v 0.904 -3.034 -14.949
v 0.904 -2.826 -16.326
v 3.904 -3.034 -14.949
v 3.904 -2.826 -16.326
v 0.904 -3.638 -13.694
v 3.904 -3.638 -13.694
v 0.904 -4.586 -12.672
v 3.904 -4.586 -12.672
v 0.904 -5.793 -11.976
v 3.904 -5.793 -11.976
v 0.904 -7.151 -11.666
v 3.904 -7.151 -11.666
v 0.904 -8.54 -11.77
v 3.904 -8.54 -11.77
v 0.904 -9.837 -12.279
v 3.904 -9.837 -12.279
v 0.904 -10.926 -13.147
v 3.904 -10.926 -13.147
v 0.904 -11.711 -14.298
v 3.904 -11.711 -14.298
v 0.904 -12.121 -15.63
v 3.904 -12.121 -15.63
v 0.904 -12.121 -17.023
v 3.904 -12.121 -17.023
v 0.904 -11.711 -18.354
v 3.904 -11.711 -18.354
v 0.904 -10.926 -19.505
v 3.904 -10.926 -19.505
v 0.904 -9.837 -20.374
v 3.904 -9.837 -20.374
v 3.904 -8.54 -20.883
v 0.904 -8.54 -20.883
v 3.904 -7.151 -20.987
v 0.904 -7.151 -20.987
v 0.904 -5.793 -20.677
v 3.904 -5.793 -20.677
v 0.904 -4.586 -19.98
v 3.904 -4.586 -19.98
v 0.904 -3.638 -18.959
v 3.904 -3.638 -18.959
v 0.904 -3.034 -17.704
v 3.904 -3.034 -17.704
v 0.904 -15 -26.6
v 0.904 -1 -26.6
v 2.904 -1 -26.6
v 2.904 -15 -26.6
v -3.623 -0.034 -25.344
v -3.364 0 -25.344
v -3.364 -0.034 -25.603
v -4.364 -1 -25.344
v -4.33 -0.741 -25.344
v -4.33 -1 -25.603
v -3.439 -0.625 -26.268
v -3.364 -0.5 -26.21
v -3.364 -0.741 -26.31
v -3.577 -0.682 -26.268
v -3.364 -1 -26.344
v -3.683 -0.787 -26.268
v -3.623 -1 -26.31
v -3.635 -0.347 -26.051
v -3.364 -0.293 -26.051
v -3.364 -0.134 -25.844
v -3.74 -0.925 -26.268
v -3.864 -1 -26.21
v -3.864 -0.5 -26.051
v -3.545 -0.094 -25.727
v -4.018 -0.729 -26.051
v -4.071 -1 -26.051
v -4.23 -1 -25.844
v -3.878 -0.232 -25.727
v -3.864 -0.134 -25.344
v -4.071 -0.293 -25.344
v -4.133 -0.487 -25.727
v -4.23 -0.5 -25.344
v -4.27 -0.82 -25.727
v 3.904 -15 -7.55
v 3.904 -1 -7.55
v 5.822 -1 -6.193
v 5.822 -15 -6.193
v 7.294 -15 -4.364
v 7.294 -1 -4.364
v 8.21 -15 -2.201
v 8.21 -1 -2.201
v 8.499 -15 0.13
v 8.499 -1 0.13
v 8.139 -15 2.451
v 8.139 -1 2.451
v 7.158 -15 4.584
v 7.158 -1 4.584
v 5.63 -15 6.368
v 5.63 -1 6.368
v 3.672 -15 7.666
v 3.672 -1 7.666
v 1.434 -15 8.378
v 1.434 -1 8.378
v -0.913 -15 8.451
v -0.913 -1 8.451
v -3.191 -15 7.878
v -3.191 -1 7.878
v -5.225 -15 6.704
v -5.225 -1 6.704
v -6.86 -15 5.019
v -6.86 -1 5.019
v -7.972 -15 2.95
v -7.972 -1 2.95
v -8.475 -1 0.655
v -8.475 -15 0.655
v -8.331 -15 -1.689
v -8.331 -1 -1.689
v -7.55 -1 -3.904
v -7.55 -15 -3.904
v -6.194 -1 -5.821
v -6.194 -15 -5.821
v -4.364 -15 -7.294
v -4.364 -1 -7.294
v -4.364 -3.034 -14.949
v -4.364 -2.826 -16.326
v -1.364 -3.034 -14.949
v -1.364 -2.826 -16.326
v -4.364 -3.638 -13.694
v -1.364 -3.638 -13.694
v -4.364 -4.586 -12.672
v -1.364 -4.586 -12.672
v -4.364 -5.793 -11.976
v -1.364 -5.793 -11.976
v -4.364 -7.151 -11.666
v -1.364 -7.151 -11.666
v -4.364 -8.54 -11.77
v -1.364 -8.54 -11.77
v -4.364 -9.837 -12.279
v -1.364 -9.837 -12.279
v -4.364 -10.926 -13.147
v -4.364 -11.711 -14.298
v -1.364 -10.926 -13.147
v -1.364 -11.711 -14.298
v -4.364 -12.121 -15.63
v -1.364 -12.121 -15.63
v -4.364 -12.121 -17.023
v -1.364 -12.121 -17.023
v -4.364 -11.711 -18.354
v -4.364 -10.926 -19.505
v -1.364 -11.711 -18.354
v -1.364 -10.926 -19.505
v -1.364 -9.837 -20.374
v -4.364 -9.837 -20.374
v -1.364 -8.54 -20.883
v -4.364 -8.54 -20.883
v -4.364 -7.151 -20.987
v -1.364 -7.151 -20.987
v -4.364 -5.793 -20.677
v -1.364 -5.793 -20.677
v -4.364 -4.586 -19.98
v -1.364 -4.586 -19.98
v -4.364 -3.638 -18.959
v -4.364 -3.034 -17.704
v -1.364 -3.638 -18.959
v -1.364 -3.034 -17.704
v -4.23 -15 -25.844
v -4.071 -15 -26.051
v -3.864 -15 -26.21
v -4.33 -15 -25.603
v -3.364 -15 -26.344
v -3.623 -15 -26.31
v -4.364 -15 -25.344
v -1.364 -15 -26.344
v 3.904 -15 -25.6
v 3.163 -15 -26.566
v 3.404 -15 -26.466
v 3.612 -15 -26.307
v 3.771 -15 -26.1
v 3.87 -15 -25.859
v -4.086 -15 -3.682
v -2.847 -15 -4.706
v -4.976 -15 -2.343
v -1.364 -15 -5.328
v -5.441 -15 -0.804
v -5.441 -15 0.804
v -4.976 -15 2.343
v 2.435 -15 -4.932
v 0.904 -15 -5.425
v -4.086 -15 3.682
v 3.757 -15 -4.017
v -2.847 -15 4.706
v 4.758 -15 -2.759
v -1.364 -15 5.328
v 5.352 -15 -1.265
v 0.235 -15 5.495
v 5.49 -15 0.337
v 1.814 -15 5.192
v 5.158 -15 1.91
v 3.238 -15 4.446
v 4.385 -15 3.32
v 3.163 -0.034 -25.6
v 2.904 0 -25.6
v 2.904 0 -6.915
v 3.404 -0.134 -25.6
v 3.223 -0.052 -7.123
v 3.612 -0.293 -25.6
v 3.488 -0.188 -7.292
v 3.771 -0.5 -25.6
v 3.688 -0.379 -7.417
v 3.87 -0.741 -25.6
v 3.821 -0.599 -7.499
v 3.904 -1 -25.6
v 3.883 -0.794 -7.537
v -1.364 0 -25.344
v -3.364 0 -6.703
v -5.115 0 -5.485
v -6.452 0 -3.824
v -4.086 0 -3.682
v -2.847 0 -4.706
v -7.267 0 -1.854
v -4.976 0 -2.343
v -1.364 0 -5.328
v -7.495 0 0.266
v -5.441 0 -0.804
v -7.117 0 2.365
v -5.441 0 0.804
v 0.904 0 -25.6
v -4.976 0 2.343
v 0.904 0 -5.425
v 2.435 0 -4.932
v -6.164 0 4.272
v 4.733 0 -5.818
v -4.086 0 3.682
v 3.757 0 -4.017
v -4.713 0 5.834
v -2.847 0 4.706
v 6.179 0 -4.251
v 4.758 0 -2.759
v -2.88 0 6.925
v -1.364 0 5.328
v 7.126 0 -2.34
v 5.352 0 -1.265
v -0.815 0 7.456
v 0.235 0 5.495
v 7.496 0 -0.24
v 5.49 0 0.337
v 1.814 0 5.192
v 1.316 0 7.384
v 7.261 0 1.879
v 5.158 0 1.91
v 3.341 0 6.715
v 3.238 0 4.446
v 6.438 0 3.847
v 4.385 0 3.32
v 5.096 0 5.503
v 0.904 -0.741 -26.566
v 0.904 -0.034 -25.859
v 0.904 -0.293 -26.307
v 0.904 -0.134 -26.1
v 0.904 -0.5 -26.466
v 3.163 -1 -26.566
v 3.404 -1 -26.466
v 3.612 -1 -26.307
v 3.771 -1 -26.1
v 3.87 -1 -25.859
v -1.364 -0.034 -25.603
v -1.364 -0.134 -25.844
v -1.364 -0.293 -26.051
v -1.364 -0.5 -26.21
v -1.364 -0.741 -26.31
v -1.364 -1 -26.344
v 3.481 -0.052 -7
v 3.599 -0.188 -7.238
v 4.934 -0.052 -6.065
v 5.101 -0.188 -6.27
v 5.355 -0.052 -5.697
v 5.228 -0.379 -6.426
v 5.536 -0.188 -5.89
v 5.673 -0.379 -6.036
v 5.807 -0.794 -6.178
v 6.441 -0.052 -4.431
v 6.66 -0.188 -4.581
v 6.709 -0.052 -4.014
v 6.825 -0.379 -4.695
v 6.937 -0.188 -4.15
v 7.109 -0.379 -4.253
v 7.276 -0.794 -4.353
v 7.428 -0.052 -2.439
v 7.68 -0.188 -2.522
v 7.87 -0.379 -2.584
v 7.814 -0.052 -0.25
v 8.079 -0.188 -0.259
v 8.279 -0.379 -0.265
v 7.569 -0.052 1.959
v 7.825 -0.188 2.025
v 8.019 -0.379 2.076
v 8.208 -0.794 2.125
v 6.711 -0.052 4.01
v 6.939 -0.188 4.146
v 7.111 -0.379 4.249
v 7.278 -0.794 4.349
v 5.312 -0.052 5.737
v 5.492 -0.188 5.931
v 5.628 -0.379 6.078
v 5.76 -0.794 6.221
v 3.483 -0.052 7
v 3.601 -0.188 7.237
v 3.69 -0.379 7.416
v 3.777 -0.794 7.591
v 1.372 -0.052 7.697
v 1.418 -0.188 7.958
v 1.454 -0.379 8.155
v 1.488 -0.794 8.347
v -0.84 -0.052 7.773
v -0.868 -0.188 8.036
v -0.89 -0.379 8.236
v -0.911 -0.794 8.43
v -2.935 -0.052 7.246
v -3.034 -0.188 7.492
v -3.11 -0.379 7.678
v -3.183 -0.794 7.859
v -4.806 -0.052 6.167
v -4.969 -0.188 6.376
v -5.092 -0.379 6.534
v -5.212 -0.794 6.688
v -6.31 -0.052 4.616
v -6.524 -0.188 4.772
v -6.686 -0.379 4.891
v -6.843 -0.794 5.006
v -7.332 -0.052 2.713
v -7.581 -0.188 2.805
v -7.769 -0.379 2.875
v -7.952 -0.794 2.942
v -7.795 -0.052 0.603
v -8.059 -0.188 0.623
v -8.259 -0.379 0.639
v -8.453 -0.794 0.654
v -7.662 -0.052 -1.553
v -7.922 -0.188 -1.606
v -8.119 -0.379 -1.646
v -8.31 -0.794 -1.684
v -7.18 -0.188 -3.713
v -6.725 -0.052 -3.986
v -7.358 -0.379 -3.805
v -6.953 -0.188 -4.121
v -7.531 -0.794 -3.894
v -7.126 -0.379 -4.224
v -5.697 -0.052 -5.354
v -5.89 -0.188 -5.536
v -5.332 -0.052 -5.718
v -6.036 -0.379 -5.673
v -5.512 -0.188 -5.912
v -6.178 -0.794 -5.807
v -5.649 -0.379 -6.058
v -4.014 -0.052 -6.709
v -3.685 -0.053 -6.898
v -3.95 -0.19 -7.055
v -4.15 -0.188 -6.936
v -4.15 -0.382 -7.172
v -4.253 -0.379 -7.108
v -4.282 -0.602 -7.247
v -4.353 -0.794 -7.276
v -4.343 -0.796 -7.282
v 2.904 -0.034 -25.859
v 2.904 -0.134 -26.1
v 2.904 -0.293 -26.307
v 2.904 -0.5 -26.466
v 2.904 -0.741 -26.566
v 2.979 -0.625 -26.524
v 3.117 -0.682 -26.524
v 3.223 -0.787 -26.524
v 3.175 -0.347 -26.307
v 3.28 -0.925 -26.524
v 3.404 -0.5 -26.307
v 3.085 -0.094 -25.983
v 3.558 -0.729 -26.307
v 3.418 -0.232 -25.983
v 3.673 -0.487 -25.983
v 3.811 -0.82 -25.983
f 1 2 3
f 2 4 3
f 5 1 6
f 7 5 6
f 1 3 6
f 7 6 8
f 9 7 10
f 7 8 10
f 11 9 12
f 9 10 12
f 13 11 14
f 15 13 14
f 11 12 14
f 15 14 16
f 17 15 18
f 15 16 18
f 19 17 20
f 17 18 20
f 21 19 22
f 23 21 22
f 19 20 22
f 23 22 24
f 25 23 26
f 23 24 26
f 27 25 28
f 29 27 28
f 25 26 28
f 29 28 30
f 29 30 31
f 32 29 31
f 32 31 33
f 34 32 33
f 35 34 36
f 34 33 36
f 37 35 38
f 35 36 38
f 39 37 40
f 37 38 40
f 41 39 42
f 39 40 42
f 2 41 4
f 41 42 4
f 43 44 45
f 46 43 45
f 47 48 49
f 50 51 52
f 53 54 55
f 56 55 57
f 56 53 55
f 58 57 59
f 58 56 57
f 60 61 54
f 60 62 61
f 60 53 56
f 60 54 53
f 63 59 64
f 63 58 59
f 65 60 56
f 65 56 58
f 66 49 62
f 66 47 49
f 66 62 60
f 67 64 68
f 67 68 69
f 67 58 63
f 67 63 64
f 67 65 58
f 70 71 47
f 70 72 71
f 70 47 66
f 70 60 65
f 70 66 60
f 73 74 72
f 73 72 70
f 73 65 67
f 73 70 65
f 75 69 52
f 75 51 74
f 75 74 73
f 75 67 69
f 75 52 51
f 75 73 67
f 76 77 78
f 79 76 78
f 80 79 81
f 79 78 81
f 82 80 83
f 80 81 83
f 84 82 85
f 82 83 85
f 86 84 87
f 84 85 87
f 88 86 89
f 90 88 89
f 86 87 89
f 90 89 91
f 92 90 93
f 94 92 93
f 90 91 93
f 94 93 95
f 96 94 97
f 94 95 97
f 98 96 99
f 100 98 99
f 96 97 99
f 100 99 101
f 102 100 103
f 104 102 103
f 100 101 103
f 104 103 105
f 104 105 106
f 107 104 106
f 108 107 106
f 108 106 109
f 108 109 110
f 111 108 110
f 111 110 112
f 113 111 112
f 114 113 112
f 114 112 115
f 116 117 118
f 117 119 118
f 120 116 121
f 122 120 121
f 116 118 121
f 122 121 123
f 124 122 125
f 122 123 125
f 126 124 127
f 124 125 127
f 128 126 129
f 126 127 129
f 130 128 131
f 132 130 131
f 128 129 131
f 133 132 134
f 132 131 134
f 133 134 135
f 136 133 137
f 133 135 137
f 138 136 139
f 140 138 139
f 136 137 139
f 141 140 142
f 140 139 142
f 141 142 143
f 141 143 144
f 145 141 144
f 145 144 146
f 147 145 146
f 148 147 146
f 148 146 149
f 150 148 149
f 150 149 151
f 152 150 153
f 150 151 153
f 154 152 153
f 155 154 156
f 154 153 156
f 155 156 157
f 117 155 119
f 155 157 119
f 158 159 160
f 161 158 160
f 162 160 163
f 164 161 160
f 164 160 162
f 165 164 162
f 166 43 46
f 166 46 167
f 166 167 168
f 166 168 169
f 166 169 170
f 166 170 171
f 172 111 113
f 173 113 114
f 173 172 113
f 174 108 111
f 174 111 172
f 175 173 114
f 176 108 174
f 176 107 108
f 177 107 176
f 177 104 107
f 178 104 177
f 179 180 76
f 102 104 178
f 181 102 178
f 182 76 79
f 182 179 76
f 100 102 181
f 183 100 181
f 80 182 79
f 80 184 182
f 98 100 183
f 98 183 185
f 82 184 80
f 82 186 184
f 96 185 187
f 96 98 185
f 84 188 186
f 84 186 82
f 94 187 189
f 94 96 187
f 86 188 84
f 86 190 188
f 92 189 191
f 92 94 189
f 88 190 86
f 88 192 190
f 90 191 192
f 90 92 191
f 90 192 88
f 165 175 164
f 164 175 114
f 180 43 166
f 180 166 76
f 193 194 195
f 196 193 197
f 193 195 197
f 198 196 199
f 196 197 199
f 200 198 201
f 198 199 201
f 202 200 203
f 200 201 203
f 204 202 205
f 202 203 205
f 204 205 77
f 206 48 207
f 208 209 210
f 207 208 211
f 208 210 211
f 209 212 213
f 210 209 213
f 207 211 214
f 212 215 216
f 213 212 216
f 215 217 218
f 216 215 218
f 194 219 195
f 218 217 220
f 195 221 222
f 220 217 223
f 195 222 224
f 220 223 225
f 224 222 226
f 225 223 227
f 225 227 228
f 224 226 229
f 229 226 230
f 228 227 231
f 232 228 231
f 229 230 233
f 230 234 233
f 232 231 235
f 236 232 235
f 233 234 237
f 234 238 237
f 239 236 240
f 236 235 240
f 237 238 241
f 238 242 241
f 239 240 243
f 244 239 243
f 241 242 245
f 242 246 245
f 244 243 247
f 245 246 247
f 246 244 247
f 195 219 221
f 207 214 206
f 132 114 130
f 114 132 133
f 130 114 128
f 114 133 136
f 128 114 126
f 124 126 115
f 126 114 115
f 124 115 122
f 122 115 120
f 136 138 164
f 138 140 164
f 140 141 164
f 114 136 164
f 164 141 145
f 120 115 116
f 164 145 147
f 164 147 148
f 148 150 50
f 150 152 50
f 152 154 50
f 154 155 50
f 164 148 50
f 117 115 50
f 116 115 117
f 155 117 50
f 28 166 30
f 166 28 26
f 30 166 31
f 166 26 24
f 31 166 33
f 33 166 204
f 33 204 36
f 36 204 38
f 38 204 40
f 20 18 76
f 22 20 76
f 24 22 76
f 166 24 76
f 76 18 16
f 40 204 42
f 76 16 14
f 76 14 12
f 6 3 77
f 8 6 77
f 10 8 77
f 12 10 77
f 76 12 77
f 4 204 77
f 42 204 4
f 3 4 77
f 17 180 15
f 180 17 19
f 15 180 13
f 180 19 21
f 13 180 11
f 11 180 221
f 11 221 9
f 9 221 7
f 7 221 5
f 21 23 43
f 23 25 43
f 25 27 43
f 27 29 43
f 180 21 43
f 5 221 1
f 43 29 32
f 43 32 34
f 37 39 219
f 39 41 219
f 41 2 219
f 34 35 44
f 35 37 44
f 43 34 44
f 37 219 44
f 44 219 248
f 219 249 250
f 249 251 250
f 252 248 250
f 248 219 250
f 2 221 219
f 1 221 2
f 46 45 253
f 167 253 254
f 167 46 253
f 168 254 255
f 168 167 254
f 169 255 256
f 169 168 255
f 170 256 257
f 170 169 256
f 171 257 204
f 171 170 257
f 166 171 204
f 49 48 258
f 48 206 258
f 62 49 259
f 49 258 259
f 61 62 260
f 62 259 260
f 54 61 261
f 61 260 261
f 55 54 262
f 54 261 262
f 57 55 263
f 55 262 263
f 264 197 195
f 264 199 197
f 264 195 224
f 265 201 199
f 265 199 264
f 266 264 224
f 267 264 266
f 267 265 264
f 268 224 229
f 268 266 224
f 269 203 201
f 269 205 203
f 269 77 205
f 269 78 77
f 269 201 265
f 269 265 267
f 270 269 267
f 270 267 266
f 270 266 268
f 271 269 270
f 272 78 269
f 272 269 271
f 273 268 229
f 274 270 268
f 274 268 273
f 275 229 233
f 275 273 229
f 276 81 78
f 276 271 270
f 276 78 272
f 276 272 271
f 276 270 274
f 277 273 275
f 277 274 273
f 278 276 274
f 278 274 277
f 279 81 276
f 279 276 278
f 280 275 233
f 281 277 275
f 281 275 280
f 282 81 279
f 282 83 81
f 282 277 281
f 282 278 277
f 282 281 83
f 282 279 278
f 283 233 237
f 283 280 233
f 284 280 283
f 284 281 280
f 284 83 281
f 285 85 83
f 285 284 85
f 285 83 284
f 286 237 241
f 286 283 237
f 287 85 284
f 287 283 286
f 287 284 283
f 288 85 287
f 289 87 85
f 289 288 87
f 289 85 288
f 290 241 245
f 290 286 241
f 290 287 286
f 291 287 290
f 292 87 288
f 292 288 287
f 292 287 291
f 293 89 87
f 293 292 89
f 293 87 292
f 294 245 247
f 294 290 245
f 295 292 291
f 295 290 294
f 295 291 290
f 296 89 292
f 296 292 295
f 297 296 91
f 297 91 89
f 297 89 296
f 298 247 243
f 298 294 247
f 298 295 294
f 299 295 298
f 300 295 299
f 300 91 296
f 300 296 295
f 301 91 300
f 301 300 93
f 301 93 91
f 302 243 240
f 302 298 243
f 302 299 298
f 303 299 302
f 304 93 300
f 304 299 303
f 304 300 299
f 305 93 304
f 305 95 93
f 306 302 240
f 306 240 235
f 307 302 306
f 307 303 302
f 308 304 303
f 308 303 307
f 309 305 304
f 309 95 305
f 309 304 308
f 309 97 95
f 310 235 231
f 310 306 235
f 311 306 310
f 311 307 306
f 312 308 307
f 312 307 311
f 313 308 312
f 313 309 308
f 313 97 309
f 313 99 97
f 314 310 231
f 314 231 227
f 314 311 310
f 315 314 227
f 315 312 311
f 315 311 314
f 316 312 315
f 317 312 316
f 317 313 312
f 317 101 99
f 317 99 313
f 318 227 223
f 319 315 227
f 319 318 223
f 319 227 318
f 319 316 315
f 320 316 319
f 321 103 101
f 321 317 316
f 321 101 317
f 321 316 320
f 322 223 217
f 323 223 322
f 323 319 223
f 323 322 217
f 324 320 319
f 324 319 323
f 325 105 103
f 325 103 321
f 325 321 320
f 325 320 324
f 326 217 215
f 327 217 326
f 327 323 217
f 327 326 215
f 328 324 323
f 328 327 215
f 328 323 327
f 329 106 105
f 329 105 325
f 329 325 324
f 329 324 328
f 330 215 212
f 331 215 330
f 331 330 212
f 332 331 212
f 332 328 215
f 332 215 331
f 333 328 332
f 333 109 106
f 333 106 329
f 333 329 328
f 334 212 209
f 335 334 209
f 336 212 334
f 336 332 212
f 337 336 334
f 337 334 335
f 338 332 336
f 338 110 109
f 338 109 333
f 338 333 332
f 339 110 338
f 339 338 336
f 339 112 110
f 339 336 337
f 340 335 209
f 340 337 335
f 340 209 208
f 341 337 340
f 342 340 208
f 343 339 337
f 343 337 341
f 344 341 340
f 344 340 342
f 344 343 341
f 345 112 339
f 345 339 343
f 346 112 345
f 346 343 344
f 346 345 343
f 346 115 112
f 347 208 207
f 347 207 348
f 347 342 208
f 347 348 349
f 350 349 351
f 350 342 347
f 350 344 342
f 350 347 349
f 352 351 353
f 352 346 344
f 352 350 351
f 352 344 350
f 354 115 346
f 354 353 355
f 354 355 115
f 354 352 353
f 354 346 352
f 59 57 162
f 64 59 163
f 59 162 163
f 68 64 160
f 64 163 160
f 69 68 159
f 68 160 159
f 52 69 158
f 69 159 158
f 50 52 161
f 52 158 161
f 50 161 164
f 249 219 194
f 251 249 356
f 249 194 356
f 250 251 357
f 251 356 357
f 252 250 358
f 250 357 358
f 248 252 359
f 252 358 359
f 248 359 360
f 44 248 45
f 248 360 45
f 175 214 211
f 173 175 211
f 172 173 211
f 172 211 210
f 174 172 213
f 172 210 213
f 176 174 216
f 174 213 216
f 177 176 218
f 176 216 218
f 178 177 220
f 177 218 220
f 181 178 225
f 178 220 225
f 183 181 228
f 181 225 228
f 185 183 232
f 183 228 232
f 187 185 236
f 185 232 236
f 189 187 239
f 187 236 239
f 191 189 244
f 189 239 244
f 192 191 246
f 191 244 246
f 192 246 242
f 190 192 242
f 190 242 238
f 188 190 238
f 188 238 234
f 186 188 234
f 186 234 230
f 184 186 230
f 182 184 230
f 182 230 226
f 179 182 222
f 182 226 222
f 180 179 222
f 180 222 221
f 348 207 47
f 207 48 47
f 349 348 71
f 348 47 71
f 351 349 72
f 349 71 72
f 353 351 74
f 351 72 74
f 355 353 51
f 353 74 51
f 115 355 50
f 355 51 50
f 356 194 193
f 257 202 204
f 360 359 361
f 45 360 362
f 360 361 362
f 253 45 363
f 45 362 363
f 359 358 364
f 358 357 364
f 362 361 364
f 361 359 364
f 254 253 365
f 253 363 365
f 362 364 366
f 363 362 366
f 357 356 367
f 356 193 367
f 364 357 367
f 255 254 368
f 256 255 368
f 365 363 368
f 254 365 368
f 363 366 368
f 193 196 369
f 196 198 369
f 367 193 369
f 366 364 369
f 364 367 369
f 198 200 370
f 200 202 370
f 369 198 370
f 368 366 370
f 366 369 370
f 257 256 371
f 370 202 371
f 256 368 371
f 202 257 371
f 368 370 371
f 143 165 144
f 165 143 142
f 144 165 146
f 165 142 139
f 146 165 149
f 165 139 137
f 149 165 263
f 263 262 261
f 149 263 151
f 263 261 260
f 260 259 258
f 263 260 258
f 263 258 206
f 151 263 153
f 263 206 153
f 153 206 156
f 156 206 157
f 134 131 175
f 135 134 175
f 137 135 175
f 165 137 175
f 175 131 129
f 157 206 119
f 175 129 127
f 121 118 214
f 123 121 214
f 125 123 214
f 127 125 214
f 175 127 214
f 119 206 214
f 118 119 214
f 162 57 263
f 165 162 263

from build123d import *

# Parameters (mm, degrees)
F1_DEPTH = 15
F2_R     = 4.6736
F3_DEPTH = 29.8
F4_R     = 1


with BuildPart() as f1:
    # F0 (on Front) → F1 (new body)
    with BuildSketch(Plane.XZ):
        with BuildLine():
            ThreePointArc((-1.364345, -5.328092), (0.234996, 5.494977), (0.904479, -5.425119))
            Line((0.904479, -5.425119), (0.904479, -26.600169))
            Line((0.904479, -26.600169), (3.904479, -26.600169))
            Line((3.904479, -26.600169), (3.904479, -7.550169))
            ThreePointArc((3.904479, -7.550169), (0.2632, 8.495924), (-4.364345, -7.294004))
            Line((-4.364345, -7.294004), (-4.364345, -26.344004))
            Line((-4.364345, -26.344004), (-1.364345, -26.344004))
            Line((-1.364345, -26.344004), (-1.364345, -5.328092))
        make_face()
    extrude(amount=F1_DEPTH)

    # F2 (on face) → F3 (cut, symmetric)
    with BuildSketch(Plane.YZ.offset(3.904479)):
        with Locations((-7.5, -16.32629)):
            Circle(F2_R)
    extrude(amount=F3_DEPTH, both=True, mode=Mode.SUBTRACT)

    # F4
    f4_edges = [f1.edges().sort_by_distance(p)[0] for p in [
        (-4.364345, 0, -16.819004),
        (0.2632, 0, 8.495924),
        (3.904479, 0, -17.075169),
        (2.404479, 0, -26.600169),
        (-2.864345, 0, -26.344004),
        (3.904479, -7.5, -26.600169),
        (-4.364345, -7.5, -26.344004),
    ]]
    fillet(f4_edges, radius=F4_R)


solid = f1.part
